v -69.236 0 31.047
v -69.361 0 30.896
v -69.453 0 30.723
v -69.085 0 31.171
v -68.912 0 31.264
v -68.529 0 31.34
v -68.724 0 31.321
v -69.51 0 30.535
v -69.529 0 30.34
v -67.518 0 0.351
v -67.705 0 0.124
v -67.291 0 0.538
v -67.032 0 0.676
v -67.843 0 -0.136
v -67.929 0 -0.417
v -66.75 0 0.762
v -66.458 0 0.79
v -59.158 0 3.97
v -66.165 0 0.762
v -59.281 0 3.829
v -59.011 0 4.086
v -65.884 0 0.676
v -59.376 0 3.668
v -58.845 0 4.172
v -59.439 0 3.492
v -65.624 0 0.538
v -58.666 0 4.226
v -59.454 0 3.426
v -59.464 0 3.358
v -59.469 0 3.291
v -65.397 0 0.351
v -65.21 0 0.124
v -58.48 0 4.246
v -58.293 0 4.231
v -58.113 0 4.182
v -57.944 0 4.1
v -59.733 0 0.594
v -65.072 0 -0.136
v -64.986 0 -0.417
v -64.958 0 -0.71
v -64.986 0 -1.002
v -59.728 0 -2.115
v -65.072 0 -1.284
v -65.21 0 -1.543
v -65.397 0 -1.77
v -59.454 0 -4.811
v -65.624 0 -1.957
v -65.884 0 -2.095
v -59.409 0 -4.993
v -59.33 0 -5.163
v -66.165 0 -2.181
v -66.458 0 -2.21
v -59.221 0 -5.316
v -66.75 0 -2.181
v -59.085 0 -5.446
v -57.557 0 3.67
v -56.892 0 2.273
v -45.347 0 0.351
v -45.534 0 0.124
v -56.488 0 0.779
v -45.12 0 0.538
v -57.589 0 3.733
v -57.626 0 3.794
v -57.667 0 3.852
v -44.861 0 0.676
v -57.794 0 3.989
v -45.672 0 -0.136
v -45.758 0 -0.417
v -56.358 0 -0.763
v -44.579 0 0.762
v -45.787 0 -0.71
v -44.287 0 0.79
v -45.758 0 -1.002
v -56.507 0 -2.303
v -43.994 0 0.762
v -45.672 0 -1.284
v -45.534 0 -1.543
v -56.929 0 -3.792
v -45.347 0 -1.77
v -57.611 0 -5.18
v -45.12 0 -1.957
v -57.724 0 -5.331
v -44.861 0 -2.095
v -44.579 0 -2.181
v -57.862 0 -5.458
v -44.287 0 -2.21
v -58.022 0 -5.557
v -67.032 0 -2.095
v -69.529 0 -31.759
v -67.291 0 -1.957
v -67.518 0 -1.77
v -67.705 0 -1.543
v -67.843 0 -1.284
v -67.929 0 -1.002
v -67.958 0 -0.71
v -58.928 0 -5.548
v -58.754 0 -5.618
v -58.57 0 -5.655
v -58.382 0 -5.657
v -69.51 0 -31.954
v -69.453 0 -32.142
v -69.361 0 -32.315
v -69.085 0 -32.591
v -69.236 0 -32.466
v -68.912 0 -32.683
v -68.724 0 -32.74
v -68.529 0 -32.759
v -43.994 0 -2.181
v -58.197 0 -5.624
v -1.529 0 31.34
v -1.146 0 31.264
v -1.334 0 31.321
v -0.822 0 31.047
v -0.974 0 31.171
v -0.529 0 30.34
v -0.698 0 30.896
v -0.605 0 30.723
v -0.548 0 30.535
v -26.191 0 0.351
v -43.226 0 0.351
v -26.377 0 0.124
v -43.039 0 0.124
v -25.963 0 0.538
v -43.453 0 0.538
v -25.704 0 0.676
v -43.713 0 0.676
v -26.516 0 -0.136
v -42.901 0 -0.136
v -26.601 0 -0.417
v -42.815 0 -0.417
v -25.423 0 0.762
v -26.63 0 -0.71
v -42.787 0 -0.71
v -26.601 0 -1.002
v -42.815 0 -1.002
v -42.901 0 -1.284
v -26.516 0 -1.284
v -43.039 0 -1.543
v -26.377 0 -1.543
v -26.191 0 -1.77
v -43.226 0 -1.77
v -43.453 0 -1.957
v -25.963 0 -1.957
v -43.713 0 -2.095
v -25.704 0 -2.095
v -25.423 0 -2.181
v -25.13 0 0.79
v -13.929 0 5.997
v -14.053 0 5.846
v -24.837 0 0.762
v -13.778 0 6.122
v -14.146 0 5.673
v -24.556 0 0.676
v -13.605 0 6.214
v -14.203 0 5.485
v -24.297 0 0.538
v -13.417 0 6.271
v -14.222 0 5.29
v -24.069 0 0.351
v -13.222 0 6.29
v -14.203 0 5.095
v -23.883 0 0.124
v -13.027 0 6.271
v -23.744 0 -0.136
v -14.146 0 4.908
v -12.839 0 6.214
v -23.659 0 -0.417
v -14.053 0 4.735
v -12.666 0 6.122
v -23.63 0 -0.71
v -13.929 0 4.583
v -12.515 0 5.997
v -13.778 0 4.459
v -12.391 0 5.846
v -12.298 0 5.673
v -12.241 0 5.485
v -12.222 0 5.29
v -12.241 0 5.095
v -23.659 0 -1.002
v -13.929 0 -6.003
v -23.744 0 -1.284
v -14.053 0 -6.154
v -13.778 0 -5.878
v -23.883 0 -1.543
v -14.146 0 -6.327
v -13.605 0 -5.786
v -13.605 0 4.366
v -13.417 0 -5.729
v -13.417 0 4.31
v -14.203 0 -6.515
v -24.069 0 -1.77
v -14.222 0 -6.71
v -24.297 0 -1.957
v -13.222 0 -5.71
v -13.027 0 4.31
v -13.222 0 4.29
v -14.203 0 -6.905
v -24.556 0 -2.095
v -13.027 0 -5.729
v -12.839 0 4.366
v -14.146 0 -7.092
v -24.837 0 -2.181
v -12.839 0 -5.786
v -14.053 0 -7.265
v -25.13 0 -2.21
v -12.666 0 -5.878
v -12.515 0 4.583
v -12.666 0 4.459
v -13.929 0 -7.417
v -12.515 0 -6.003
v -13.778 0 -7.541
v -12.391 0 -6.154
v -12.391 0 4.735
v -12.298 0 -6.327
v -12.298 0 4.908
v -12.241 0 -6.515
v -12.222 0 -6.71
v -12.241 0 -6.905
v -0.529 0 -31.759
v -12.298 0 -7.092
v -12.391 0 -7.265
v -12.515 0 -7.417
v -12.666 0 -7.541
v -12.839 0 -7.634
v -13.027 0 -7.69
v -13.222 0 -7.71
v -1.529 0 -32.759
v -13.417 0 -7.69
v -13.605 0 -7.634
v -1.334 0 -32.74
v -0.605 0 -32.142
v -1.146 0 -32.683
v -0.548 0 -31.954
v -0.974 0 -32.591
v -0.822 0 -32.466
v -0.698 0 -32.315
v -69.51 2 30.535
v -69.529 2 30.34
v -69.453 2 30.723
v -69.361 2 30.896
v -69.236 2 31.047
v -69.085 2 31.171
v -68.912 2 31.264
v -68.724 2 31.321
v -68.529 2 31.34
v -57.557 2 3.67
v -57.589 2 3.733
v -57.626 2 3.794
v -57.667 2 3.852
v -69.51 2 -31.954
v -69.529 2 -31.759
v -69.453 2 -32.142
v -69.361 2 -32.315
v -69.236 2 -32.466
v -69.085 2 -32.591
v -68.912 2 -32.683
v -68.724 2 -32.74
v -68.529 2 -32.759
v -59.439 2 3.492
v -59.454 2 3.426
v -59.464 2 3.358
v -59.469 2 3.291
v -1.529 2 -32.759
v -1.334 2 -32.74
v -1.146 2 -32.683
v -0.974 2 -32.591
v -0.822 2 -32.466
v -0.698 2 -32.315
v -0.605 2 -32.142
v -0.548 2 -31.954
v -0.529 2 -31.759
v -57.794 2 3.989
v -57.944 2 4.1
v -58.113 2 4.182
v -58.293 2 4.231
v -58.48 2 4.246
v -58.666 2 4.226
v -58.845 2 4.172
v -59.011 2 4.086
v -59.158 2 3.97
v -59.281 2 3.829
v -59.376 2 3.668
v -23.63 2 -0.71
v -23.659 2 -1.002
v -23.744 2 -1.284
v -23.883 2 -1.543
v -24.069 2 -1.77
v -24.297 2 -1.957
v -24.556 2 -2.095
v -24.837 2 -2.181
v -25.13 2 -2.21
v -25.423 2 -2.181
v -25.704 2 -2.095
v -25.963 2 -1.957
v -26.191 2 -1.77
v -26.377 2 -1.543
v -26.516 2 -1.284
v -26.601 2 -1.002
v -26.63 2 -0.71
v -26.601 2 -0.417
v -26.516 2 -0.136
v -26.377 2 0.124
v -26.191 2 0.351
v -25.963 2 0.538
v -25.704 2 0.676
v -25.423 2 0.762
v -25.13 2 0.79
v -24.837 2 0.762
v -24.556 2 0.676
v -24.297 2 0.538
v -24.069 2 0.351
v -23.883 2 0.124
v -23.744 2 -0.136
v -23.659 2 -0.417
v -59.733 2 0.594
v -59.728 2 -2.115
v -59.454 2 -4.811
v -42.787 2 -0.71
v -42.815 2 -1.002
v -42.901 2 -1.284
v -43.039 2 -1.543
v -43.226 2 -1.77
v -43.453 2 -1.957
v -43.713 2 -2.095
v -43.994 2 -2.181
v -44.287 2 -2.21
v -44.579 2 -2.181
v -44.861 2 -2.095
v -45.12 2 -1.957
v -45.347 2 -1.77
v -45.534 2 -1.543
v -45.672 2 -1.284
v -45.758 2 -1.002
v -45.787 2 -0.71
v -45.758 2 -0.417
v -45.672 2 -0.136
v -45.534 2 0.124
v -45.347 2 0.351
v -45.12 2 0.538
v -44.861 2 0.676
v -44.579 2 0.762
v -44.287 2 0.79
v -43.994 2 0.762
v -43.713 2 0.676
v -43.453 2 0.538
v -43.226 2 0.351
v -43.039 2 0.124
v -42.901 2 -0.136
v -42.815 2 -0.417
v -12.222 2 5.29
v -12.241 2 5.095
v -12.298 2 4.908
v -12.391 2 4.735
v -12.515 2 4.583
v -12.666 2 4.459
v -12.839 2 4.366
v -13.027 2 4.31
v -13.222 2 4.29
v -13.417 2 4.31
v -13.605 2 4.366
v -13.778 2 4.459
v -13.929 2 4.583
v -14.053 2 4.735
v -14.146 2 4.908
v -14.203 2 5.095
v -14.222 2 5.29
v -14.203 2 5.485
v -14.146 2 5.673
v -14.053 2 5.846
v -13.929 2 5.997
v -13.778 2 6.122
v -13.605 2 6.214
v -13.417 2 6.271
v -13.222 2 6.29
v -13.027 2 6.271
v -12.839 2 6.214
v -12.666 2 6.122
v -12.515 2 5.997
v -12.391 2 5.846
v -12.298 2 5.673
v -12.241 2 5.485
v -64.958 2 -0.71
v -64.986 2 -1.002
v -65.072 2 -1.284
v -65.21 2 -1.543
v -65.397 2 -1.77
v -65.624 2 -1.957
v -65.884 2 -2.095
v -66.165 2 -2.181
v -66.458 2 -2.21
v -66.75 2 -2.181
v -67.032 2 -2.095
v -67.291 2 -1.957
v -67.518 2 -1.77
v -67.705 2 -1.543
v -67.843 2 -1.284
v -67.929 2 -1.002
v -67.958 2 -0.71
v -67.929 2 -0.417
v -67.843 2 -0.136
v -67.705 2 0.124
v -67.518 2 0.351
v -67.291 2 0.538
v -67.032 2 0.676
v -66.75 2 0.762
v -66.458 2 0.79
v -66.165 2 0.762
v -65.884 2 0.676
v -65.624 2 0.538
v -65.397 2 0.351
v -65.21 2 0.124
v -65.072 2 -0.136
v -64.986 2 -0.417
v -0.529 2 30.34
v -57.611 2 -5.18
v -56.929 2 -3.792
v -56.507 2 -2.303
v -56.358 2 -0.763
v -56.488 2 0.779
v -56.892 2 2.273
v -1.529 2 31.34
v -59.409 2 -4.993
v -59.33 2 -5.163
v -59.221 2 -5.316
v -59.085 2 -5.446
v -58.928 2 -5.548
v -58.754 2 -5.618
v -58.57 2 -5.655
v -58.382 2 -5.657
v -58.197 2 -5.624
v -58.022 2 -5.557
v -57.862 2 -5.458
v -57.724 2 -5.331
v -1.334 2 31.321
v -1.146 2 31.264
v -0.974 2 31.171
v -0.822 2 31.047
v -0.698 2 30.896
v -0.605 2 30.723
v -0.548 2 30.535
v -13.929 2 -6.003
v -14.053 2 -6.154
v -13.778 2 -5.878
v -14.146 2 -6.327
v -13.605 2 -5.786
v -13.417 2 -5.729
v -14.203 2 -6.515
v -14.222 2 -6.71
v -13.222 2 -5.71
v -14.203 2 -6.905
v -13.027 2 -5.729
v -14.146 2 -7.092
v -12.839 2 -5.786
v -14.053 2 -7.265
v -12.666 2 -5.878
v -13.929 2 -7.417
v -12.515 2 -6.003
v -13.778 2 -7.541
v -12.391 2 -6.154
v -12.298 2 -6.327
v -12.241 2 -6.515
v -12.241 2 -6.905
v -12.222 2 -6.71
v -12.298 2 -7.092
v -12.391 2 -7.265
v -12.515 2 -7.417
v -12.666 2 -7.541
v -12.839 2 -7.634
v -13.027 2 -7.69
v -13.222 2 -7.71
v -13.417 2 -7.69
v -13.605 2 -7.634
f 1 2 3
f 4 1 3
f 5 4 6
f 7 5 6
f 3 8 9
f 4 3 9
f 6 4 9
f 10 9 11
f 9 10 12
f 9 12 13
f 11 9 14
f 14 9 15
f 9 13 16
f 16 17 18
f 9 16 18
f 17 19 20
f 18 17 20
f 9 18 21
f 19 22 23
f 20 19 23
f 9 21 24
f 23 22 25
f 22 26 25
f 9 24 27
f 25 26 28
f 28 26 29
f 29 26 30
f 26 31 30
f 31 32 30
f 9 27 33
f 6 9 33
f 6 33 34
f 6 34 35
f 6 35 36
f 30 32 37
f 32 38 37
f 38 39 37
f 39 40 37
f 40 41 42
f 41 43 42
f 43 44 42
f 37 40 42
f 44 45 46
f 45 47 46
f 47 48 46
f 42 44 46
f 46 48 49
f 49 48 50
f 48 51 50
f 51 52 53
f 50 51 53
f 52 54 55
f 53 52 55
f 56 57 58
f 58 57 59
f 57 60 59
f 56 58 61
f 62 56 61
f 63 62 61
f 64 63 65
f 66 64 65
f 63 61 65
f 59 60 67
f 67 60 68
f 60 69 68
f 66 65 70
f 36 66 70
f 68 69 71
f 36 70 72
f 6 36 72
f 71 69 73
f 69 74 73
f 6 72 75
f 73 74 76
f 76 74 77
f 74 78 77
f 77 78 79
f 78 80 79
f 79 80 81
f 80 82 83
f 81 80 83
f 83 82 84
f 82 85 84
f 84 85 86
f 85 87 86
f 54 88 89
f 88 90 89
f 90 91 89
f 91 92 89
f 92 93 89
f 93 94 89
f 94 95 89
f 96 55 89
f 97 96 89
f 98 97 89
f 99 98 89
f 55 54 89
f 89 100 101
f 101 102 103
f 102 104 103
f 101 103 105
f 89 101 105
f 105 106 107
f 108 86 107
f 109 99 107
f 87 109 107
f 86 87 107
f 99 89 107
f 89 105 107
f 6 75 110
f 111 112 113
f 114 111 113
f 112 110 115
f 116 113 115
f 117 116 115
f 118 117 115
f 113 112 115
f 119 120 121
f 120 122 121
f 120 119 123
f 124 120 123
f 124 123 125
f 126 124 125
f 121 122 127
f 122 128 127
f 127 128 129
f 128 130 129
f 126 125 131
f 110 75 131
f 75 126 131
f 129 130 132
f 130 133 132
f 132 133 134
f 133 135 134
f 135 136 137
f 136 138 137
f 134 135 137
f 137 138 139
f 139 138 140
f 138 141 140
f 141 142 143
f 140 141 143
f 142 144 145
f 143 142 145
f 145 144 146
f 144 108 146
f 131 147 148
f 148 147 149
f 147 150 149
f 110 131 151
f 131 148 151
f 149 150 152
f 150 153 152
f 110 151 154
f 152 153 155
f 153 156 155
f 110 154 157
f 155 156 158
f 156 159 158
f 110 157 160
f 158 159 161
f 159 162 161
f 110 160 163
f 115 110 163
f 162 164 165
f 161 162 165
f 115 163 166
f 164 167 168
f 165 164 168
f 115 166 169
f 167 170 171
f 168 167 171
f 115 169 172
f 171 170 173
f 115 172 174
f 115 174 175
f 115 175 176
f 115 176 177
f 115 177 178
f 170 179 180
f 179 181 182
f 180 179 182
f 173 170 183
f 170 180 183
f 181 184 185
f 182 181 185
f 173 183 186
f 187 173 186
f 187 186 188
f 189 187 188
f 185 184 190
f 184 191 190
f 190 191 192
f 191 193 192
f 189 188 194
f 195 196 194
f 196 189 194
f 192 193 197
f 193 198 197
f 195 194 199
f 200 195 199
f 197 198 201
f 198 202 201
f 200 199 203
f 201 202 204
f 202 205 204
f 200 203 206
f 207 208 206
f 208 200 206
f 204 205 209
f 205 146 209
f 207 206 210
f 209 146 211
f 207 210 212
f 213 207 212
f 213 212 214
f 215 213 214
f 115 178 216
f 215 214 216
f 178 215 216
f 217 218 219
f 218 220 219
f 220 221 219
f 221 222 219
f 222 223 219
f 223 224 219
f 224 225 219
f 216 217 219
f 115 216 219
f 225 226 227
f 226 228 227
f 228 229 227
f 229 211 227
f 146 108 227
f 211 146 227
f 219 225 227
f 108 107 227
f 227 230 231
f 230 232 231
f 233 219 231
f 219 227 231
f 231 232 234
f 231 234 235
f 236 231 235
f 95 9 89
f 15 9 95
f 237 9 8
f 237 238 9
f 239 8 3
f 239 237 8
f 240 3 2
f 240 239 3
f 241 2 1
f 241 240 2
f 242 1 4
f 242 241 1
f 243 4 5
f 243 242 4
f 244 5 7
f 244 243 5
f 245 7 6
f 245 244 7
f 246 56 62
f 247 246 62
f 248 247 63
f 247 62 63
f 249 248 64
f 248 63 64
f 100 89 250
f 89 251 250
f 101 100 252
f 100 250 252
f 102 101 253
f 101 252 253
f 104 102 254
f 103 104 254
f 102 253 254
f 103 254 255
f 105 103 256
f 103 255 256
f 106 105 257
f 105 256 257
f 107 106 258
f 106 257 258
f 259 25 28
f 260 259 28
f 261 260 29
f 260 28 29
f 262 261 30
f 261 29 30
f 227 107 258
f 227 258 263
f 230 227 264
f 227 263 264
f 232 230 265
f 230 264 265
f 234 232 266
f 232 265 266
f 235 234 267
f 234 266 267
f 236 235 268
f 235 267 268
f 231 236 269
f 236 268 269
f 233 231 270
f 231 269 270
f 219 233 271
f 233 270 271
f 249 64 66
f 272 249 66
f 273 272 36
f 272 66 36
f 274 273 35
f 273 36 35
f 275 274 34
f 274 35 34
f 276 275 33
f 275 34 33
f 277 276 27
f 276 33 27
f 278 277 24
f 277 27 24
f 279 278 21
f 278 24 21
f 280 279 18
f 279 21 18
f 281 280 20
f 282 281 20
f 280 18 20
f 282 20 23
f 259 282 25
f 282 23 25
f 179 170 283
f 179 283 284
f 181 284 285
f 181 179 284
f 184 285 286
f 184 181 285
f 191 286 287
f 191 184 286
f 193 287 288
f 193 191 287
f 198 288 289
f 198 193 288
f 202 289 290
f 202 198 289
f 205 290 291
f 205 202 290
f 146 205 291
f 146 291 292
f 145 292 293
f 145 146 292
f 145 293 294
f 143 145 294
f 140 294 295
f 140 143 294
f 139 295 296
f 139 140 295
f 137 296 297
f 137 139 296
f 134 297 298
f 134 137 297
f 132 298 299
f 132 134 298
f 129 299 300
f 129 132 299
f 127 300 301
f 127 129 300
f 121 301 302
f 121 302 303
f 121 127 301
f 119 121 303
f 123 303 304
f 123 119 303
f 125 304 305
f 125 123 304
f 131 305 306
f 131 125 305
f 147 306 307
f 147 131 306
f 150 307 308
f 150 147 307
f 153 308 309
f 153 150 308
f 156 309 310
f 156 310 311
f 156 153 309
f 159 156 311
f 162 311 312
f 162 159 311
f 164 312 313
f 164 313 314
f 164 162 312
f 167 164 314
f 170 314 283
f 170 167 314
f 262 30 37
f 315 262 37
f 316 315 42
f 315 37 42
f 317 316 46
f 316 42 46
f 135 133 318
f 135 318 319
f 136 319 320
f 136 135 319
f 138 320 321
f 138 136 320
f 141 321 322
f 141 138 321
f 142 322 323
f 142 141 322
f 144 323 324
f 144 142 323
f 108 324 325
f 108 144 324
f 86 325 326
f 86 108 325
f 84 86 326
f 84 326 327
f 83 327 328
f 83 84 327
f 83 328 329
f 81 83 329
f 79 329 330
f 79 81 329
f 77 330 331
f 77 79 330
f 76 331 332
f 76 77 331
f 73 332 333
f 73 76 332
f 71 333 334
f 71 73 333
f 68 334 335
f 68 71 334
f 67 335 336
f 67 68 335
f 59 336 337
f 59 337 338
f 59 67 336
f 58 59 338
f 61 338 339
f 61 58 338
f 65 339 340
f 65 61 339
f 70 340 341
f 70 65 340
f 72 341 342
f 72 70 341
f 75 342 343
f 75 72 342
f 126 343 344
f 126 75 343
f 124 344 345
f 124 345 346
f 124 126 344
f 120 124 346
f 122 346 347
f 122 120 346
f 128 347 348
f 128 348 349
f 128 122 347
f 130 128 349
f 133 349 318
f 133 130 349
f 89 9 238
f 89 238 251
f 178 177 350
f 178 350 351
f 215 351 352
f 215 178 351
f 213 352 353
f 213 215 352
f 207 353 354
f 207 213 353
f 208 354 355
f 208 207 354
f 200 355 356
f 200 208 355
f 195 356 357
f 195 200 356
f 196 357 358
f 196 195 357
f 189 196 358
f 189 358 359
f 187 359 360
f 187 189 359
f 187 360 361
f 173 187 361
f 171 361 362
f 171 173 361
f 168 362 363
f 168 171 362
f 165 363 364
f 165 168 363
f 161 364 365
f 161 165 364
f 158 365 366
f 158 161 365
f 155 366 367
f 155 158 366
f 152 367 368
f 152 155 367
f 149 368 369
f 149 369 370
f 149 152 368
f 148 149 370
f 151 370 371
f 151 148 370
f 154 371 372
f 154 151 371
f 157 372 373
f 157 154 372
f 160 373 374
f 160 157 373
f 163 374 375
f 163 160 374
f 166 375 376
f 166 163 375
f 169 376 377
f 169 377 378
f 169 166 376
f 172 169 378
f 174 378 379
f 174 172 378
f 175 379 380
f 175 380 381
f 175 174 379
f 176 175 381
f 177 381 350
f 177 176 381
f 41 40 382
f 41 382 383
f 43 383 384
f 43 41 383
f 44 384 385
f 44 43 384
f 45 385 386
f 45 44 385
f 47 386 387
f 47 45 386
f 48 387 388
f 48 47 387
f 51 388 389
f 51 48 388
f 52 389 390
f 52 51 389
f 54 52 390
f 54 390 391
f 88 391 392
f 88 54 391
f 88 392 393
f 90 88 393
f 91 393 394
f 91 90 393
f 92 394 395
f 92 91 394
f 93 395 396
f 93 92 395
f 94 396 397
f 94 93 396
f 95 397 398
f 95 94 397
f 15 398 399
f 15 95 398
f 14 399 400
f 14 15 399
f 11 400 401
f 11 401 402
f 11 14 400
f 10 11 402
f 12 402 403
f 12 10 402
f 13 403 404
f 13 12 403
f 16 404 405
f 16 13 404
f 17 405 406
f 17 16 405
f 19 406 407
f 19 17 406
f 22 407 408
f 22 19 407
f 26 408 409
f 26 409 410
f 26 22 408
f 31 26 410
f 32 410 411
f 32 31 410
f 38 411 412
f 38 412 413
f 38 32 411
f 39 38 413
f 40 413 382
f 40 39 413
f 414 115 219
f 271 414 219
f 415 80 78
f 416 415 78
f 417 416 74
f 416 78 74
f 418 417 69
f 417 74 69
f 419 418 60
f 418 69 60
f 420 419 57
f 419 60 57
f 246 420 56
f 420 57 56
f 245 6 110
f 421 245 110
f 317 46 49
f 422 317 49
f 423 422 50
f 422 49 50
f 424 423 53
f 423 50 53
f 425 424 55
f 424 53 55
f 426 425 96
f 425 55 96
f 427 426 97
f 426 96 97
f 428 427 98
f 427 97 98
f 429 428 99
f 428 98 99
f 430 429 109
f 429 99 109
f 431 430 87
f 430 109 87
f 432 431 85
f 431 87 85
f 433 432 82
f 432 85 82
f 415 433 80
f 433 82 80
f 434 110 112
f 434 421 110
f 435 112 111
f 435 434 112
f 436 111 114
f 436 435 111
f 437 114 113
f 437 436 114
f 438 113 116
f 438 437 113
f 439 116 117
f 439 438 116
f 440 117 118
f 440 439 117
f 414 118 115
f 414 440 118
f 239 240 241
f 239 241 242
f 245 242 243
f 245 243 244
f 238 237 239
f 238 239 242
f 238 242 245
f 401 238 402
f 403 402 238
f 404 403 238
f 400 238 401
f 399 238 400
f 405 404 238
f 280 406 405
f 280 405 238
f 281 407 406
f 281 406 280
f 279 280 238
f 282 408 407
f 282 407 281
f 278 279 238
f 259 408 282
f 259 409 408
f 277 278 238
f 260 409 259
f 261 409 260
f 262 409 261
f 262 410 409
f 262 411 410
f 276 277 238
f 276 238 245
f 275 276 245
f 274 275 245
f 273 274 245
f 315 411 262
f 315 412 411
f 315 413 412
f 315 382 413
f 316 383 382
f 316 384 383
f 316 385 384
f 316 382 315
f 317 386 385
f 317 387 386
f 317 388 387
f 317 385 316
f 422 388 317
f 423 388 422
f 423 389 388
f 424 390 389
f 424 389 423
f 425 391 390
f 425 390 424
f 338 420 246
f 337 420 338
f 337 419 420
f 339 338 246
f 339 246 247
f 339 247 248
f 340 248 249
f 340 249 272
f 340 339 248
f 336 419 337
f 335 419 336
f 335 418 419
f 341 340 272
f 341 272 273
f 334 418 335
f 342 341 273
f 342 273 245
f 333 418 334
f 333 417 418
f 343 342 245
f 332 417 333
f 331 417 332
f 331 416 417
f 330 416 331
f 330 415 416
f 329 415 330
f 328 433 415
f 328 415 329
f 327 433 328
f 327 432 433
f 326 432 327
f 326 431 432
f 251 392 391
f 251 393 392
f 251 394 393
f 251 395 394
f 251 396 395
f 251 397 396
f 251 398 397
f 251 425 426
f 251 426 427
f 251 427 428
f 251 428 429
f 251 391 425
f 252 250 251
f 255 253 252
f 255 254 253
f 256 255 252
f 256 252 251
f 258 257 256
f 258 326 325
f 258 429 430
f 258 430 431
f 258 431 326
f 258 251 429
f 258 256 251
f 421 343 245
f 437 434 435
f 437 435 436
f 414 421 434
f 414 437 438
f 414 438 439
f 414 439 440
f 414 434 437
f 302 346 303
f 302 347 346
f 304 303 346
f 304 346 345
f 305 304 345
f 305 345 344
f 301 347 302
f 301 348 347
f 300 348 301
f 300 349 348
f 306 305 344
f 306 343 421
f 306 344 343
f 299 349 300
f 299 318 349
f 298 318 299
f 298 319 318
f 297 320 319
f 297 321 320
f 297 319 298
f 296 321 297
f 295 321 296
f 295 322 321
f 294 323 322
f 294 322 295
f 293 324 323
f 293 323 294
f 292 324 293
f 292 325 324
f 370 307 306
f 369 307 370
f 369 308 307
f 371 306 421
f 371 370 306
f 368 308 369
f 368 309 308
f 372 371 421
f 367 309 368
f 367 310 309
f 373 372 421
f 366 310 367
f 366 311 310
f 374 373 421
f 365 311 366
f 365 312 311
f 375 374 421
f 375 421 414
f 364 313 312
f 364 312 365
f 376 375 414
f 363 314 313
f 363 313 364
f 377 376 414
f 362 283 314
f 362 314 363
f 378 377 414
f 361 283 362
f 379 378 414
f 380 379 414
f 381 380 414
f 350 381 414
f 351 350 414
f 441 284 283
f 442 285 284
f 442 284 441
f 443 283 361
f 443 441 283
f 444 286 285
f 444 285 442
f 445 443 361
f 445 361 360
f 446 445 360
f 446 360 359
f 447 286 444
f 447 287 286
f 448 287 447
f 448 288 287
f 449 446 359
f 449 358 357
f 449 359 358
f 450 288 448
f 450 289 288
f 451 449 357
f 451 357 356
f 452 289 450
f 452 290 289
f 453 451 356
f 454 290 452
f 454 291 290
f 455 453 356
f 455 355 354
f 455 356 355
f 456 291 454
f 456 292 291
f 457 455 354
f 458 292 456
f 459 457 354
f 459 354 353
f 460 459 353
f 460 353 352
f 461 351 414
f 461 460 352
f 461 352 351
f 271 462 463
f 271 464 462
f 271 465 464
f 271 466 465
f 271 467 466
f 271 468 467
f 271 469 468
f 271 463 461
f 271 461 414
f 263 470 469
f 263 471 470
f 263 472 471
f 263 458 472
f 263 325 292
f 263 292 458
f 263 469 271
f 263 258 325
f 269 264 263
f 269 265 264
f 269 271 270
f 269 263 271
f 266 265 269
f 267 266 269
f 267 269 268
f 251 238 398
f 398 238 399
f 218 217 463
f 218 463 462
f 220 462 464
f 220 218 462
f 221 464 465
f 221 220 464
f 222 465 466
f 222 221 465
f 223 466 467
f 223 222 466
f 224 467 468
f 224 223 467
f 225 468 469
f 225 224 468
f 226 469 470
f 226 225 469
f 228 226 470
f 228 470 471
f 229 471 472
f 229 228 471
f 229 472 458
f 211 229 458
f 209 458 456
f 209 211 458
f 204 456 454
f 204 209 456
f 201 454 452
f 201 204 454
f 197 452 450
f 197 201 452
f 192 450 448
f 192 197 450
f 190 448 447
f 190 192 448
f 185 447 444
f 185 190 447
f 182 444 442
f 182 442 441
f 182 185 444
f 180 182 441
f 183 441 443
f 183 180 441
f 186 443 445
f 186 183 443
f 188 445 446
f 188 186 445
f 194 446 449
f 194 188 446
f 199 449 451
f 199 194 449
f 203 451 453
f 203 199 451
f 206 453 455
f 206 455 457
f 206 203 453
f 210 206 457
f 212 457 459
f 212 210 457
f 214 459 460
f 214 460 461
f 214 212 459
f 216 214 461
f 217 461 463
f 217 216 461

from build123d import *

# Parameters (mm, degrees)
CROQUIS1_W              = 69
CROQUIS1_H              = 64.099232263
CROQUIS1_R              = 1
CROQUIS1_R_2            = 1.5
SALIENTE_EXTRUIR1_DEPTH = 2
REDONDEO1_R             = 1


with BuildPart() as part:
    # Croquis1 → Saliente-Extruir1 (new body)
    with BuildSketch(Plane(origin=(0, 0, 0), x_dir=(1, 0, 0), z_dir=(0, 1, 0))):
        with Locations((-35.029110392, 0.70962906)):
            Rectangle(CROQUIS1_W, CROQUIS1_H)
        with BuildLine():
            ThreePointArc((-59.454384172, 4.810651437), (-58.662459069, 5.641041677), (-57.611472837, 5.180475439))
            ThreePointArc((-57.611472837, 5.180475439), (-56.358108465, 0.762709988), (-57.556841461, -3.67019121))
            ThreePointArc((-57.556841461, -3.67019121), (-57.60722938, -3.763799887), (-57.667223738, -3.851562088))
            ThreePointArc((-57.667223738, -3.851562088), (-58.665645829, -4.226208068), (-59.438939328, -3.491889713))
            ThreePointArc((-59.438939328, -3.491889713), (-59.459295474, -3.392138765), (-59.469455013, -3.290840157))
            ThreePointArc((-59.469455013, -3.290840157), (-59.763795222, 0.760467206), (-59.454384172, 4.810651437))
        make_face(mode=Mode.SUBTRACT)
        with Locations((-13.221985845, -5.290370941)):
            Circle(CROQUIS1_R, mode=Mode.SUBTRACT)
        with Locations((-66.45759178, 0.709629059)):
            Circle(CROQUIS1_R_2, mode=Mode.SUBTRACT)
        with Locations((-44.286593268, 0.709629059)):
            Circle(CROQUIS1_R_2, mode=Mode.SUBTRACT)
        with Locations((-25.130085357, 0.709629059)):
            Circle(CROQUIS1_R_2, mode=Mode.SUBTRACT)
        with Locations((-13.221985845, 6.709629059)):
            Circle(CROQUIS1_R, mode=Mode.SUBTRACT)
    extrude(amount=SALIENTE_EXTRUIR1_DEPTH)

    # Redondeo1
    redondeo1_edges = [part.edges().sort_by_distance(p)[0] for p in [
        (-0.529110392, 1, 31.339987072),
        (-69.529110392, 1, 31.339987072),
        (-69.529110392, 1, -32.759245191),
        (-0.529110392, 1, -32.759245191),
    ]]
    fillet(redondeo1_edges, radius=REDONDEO1_R)


solid = part.part
